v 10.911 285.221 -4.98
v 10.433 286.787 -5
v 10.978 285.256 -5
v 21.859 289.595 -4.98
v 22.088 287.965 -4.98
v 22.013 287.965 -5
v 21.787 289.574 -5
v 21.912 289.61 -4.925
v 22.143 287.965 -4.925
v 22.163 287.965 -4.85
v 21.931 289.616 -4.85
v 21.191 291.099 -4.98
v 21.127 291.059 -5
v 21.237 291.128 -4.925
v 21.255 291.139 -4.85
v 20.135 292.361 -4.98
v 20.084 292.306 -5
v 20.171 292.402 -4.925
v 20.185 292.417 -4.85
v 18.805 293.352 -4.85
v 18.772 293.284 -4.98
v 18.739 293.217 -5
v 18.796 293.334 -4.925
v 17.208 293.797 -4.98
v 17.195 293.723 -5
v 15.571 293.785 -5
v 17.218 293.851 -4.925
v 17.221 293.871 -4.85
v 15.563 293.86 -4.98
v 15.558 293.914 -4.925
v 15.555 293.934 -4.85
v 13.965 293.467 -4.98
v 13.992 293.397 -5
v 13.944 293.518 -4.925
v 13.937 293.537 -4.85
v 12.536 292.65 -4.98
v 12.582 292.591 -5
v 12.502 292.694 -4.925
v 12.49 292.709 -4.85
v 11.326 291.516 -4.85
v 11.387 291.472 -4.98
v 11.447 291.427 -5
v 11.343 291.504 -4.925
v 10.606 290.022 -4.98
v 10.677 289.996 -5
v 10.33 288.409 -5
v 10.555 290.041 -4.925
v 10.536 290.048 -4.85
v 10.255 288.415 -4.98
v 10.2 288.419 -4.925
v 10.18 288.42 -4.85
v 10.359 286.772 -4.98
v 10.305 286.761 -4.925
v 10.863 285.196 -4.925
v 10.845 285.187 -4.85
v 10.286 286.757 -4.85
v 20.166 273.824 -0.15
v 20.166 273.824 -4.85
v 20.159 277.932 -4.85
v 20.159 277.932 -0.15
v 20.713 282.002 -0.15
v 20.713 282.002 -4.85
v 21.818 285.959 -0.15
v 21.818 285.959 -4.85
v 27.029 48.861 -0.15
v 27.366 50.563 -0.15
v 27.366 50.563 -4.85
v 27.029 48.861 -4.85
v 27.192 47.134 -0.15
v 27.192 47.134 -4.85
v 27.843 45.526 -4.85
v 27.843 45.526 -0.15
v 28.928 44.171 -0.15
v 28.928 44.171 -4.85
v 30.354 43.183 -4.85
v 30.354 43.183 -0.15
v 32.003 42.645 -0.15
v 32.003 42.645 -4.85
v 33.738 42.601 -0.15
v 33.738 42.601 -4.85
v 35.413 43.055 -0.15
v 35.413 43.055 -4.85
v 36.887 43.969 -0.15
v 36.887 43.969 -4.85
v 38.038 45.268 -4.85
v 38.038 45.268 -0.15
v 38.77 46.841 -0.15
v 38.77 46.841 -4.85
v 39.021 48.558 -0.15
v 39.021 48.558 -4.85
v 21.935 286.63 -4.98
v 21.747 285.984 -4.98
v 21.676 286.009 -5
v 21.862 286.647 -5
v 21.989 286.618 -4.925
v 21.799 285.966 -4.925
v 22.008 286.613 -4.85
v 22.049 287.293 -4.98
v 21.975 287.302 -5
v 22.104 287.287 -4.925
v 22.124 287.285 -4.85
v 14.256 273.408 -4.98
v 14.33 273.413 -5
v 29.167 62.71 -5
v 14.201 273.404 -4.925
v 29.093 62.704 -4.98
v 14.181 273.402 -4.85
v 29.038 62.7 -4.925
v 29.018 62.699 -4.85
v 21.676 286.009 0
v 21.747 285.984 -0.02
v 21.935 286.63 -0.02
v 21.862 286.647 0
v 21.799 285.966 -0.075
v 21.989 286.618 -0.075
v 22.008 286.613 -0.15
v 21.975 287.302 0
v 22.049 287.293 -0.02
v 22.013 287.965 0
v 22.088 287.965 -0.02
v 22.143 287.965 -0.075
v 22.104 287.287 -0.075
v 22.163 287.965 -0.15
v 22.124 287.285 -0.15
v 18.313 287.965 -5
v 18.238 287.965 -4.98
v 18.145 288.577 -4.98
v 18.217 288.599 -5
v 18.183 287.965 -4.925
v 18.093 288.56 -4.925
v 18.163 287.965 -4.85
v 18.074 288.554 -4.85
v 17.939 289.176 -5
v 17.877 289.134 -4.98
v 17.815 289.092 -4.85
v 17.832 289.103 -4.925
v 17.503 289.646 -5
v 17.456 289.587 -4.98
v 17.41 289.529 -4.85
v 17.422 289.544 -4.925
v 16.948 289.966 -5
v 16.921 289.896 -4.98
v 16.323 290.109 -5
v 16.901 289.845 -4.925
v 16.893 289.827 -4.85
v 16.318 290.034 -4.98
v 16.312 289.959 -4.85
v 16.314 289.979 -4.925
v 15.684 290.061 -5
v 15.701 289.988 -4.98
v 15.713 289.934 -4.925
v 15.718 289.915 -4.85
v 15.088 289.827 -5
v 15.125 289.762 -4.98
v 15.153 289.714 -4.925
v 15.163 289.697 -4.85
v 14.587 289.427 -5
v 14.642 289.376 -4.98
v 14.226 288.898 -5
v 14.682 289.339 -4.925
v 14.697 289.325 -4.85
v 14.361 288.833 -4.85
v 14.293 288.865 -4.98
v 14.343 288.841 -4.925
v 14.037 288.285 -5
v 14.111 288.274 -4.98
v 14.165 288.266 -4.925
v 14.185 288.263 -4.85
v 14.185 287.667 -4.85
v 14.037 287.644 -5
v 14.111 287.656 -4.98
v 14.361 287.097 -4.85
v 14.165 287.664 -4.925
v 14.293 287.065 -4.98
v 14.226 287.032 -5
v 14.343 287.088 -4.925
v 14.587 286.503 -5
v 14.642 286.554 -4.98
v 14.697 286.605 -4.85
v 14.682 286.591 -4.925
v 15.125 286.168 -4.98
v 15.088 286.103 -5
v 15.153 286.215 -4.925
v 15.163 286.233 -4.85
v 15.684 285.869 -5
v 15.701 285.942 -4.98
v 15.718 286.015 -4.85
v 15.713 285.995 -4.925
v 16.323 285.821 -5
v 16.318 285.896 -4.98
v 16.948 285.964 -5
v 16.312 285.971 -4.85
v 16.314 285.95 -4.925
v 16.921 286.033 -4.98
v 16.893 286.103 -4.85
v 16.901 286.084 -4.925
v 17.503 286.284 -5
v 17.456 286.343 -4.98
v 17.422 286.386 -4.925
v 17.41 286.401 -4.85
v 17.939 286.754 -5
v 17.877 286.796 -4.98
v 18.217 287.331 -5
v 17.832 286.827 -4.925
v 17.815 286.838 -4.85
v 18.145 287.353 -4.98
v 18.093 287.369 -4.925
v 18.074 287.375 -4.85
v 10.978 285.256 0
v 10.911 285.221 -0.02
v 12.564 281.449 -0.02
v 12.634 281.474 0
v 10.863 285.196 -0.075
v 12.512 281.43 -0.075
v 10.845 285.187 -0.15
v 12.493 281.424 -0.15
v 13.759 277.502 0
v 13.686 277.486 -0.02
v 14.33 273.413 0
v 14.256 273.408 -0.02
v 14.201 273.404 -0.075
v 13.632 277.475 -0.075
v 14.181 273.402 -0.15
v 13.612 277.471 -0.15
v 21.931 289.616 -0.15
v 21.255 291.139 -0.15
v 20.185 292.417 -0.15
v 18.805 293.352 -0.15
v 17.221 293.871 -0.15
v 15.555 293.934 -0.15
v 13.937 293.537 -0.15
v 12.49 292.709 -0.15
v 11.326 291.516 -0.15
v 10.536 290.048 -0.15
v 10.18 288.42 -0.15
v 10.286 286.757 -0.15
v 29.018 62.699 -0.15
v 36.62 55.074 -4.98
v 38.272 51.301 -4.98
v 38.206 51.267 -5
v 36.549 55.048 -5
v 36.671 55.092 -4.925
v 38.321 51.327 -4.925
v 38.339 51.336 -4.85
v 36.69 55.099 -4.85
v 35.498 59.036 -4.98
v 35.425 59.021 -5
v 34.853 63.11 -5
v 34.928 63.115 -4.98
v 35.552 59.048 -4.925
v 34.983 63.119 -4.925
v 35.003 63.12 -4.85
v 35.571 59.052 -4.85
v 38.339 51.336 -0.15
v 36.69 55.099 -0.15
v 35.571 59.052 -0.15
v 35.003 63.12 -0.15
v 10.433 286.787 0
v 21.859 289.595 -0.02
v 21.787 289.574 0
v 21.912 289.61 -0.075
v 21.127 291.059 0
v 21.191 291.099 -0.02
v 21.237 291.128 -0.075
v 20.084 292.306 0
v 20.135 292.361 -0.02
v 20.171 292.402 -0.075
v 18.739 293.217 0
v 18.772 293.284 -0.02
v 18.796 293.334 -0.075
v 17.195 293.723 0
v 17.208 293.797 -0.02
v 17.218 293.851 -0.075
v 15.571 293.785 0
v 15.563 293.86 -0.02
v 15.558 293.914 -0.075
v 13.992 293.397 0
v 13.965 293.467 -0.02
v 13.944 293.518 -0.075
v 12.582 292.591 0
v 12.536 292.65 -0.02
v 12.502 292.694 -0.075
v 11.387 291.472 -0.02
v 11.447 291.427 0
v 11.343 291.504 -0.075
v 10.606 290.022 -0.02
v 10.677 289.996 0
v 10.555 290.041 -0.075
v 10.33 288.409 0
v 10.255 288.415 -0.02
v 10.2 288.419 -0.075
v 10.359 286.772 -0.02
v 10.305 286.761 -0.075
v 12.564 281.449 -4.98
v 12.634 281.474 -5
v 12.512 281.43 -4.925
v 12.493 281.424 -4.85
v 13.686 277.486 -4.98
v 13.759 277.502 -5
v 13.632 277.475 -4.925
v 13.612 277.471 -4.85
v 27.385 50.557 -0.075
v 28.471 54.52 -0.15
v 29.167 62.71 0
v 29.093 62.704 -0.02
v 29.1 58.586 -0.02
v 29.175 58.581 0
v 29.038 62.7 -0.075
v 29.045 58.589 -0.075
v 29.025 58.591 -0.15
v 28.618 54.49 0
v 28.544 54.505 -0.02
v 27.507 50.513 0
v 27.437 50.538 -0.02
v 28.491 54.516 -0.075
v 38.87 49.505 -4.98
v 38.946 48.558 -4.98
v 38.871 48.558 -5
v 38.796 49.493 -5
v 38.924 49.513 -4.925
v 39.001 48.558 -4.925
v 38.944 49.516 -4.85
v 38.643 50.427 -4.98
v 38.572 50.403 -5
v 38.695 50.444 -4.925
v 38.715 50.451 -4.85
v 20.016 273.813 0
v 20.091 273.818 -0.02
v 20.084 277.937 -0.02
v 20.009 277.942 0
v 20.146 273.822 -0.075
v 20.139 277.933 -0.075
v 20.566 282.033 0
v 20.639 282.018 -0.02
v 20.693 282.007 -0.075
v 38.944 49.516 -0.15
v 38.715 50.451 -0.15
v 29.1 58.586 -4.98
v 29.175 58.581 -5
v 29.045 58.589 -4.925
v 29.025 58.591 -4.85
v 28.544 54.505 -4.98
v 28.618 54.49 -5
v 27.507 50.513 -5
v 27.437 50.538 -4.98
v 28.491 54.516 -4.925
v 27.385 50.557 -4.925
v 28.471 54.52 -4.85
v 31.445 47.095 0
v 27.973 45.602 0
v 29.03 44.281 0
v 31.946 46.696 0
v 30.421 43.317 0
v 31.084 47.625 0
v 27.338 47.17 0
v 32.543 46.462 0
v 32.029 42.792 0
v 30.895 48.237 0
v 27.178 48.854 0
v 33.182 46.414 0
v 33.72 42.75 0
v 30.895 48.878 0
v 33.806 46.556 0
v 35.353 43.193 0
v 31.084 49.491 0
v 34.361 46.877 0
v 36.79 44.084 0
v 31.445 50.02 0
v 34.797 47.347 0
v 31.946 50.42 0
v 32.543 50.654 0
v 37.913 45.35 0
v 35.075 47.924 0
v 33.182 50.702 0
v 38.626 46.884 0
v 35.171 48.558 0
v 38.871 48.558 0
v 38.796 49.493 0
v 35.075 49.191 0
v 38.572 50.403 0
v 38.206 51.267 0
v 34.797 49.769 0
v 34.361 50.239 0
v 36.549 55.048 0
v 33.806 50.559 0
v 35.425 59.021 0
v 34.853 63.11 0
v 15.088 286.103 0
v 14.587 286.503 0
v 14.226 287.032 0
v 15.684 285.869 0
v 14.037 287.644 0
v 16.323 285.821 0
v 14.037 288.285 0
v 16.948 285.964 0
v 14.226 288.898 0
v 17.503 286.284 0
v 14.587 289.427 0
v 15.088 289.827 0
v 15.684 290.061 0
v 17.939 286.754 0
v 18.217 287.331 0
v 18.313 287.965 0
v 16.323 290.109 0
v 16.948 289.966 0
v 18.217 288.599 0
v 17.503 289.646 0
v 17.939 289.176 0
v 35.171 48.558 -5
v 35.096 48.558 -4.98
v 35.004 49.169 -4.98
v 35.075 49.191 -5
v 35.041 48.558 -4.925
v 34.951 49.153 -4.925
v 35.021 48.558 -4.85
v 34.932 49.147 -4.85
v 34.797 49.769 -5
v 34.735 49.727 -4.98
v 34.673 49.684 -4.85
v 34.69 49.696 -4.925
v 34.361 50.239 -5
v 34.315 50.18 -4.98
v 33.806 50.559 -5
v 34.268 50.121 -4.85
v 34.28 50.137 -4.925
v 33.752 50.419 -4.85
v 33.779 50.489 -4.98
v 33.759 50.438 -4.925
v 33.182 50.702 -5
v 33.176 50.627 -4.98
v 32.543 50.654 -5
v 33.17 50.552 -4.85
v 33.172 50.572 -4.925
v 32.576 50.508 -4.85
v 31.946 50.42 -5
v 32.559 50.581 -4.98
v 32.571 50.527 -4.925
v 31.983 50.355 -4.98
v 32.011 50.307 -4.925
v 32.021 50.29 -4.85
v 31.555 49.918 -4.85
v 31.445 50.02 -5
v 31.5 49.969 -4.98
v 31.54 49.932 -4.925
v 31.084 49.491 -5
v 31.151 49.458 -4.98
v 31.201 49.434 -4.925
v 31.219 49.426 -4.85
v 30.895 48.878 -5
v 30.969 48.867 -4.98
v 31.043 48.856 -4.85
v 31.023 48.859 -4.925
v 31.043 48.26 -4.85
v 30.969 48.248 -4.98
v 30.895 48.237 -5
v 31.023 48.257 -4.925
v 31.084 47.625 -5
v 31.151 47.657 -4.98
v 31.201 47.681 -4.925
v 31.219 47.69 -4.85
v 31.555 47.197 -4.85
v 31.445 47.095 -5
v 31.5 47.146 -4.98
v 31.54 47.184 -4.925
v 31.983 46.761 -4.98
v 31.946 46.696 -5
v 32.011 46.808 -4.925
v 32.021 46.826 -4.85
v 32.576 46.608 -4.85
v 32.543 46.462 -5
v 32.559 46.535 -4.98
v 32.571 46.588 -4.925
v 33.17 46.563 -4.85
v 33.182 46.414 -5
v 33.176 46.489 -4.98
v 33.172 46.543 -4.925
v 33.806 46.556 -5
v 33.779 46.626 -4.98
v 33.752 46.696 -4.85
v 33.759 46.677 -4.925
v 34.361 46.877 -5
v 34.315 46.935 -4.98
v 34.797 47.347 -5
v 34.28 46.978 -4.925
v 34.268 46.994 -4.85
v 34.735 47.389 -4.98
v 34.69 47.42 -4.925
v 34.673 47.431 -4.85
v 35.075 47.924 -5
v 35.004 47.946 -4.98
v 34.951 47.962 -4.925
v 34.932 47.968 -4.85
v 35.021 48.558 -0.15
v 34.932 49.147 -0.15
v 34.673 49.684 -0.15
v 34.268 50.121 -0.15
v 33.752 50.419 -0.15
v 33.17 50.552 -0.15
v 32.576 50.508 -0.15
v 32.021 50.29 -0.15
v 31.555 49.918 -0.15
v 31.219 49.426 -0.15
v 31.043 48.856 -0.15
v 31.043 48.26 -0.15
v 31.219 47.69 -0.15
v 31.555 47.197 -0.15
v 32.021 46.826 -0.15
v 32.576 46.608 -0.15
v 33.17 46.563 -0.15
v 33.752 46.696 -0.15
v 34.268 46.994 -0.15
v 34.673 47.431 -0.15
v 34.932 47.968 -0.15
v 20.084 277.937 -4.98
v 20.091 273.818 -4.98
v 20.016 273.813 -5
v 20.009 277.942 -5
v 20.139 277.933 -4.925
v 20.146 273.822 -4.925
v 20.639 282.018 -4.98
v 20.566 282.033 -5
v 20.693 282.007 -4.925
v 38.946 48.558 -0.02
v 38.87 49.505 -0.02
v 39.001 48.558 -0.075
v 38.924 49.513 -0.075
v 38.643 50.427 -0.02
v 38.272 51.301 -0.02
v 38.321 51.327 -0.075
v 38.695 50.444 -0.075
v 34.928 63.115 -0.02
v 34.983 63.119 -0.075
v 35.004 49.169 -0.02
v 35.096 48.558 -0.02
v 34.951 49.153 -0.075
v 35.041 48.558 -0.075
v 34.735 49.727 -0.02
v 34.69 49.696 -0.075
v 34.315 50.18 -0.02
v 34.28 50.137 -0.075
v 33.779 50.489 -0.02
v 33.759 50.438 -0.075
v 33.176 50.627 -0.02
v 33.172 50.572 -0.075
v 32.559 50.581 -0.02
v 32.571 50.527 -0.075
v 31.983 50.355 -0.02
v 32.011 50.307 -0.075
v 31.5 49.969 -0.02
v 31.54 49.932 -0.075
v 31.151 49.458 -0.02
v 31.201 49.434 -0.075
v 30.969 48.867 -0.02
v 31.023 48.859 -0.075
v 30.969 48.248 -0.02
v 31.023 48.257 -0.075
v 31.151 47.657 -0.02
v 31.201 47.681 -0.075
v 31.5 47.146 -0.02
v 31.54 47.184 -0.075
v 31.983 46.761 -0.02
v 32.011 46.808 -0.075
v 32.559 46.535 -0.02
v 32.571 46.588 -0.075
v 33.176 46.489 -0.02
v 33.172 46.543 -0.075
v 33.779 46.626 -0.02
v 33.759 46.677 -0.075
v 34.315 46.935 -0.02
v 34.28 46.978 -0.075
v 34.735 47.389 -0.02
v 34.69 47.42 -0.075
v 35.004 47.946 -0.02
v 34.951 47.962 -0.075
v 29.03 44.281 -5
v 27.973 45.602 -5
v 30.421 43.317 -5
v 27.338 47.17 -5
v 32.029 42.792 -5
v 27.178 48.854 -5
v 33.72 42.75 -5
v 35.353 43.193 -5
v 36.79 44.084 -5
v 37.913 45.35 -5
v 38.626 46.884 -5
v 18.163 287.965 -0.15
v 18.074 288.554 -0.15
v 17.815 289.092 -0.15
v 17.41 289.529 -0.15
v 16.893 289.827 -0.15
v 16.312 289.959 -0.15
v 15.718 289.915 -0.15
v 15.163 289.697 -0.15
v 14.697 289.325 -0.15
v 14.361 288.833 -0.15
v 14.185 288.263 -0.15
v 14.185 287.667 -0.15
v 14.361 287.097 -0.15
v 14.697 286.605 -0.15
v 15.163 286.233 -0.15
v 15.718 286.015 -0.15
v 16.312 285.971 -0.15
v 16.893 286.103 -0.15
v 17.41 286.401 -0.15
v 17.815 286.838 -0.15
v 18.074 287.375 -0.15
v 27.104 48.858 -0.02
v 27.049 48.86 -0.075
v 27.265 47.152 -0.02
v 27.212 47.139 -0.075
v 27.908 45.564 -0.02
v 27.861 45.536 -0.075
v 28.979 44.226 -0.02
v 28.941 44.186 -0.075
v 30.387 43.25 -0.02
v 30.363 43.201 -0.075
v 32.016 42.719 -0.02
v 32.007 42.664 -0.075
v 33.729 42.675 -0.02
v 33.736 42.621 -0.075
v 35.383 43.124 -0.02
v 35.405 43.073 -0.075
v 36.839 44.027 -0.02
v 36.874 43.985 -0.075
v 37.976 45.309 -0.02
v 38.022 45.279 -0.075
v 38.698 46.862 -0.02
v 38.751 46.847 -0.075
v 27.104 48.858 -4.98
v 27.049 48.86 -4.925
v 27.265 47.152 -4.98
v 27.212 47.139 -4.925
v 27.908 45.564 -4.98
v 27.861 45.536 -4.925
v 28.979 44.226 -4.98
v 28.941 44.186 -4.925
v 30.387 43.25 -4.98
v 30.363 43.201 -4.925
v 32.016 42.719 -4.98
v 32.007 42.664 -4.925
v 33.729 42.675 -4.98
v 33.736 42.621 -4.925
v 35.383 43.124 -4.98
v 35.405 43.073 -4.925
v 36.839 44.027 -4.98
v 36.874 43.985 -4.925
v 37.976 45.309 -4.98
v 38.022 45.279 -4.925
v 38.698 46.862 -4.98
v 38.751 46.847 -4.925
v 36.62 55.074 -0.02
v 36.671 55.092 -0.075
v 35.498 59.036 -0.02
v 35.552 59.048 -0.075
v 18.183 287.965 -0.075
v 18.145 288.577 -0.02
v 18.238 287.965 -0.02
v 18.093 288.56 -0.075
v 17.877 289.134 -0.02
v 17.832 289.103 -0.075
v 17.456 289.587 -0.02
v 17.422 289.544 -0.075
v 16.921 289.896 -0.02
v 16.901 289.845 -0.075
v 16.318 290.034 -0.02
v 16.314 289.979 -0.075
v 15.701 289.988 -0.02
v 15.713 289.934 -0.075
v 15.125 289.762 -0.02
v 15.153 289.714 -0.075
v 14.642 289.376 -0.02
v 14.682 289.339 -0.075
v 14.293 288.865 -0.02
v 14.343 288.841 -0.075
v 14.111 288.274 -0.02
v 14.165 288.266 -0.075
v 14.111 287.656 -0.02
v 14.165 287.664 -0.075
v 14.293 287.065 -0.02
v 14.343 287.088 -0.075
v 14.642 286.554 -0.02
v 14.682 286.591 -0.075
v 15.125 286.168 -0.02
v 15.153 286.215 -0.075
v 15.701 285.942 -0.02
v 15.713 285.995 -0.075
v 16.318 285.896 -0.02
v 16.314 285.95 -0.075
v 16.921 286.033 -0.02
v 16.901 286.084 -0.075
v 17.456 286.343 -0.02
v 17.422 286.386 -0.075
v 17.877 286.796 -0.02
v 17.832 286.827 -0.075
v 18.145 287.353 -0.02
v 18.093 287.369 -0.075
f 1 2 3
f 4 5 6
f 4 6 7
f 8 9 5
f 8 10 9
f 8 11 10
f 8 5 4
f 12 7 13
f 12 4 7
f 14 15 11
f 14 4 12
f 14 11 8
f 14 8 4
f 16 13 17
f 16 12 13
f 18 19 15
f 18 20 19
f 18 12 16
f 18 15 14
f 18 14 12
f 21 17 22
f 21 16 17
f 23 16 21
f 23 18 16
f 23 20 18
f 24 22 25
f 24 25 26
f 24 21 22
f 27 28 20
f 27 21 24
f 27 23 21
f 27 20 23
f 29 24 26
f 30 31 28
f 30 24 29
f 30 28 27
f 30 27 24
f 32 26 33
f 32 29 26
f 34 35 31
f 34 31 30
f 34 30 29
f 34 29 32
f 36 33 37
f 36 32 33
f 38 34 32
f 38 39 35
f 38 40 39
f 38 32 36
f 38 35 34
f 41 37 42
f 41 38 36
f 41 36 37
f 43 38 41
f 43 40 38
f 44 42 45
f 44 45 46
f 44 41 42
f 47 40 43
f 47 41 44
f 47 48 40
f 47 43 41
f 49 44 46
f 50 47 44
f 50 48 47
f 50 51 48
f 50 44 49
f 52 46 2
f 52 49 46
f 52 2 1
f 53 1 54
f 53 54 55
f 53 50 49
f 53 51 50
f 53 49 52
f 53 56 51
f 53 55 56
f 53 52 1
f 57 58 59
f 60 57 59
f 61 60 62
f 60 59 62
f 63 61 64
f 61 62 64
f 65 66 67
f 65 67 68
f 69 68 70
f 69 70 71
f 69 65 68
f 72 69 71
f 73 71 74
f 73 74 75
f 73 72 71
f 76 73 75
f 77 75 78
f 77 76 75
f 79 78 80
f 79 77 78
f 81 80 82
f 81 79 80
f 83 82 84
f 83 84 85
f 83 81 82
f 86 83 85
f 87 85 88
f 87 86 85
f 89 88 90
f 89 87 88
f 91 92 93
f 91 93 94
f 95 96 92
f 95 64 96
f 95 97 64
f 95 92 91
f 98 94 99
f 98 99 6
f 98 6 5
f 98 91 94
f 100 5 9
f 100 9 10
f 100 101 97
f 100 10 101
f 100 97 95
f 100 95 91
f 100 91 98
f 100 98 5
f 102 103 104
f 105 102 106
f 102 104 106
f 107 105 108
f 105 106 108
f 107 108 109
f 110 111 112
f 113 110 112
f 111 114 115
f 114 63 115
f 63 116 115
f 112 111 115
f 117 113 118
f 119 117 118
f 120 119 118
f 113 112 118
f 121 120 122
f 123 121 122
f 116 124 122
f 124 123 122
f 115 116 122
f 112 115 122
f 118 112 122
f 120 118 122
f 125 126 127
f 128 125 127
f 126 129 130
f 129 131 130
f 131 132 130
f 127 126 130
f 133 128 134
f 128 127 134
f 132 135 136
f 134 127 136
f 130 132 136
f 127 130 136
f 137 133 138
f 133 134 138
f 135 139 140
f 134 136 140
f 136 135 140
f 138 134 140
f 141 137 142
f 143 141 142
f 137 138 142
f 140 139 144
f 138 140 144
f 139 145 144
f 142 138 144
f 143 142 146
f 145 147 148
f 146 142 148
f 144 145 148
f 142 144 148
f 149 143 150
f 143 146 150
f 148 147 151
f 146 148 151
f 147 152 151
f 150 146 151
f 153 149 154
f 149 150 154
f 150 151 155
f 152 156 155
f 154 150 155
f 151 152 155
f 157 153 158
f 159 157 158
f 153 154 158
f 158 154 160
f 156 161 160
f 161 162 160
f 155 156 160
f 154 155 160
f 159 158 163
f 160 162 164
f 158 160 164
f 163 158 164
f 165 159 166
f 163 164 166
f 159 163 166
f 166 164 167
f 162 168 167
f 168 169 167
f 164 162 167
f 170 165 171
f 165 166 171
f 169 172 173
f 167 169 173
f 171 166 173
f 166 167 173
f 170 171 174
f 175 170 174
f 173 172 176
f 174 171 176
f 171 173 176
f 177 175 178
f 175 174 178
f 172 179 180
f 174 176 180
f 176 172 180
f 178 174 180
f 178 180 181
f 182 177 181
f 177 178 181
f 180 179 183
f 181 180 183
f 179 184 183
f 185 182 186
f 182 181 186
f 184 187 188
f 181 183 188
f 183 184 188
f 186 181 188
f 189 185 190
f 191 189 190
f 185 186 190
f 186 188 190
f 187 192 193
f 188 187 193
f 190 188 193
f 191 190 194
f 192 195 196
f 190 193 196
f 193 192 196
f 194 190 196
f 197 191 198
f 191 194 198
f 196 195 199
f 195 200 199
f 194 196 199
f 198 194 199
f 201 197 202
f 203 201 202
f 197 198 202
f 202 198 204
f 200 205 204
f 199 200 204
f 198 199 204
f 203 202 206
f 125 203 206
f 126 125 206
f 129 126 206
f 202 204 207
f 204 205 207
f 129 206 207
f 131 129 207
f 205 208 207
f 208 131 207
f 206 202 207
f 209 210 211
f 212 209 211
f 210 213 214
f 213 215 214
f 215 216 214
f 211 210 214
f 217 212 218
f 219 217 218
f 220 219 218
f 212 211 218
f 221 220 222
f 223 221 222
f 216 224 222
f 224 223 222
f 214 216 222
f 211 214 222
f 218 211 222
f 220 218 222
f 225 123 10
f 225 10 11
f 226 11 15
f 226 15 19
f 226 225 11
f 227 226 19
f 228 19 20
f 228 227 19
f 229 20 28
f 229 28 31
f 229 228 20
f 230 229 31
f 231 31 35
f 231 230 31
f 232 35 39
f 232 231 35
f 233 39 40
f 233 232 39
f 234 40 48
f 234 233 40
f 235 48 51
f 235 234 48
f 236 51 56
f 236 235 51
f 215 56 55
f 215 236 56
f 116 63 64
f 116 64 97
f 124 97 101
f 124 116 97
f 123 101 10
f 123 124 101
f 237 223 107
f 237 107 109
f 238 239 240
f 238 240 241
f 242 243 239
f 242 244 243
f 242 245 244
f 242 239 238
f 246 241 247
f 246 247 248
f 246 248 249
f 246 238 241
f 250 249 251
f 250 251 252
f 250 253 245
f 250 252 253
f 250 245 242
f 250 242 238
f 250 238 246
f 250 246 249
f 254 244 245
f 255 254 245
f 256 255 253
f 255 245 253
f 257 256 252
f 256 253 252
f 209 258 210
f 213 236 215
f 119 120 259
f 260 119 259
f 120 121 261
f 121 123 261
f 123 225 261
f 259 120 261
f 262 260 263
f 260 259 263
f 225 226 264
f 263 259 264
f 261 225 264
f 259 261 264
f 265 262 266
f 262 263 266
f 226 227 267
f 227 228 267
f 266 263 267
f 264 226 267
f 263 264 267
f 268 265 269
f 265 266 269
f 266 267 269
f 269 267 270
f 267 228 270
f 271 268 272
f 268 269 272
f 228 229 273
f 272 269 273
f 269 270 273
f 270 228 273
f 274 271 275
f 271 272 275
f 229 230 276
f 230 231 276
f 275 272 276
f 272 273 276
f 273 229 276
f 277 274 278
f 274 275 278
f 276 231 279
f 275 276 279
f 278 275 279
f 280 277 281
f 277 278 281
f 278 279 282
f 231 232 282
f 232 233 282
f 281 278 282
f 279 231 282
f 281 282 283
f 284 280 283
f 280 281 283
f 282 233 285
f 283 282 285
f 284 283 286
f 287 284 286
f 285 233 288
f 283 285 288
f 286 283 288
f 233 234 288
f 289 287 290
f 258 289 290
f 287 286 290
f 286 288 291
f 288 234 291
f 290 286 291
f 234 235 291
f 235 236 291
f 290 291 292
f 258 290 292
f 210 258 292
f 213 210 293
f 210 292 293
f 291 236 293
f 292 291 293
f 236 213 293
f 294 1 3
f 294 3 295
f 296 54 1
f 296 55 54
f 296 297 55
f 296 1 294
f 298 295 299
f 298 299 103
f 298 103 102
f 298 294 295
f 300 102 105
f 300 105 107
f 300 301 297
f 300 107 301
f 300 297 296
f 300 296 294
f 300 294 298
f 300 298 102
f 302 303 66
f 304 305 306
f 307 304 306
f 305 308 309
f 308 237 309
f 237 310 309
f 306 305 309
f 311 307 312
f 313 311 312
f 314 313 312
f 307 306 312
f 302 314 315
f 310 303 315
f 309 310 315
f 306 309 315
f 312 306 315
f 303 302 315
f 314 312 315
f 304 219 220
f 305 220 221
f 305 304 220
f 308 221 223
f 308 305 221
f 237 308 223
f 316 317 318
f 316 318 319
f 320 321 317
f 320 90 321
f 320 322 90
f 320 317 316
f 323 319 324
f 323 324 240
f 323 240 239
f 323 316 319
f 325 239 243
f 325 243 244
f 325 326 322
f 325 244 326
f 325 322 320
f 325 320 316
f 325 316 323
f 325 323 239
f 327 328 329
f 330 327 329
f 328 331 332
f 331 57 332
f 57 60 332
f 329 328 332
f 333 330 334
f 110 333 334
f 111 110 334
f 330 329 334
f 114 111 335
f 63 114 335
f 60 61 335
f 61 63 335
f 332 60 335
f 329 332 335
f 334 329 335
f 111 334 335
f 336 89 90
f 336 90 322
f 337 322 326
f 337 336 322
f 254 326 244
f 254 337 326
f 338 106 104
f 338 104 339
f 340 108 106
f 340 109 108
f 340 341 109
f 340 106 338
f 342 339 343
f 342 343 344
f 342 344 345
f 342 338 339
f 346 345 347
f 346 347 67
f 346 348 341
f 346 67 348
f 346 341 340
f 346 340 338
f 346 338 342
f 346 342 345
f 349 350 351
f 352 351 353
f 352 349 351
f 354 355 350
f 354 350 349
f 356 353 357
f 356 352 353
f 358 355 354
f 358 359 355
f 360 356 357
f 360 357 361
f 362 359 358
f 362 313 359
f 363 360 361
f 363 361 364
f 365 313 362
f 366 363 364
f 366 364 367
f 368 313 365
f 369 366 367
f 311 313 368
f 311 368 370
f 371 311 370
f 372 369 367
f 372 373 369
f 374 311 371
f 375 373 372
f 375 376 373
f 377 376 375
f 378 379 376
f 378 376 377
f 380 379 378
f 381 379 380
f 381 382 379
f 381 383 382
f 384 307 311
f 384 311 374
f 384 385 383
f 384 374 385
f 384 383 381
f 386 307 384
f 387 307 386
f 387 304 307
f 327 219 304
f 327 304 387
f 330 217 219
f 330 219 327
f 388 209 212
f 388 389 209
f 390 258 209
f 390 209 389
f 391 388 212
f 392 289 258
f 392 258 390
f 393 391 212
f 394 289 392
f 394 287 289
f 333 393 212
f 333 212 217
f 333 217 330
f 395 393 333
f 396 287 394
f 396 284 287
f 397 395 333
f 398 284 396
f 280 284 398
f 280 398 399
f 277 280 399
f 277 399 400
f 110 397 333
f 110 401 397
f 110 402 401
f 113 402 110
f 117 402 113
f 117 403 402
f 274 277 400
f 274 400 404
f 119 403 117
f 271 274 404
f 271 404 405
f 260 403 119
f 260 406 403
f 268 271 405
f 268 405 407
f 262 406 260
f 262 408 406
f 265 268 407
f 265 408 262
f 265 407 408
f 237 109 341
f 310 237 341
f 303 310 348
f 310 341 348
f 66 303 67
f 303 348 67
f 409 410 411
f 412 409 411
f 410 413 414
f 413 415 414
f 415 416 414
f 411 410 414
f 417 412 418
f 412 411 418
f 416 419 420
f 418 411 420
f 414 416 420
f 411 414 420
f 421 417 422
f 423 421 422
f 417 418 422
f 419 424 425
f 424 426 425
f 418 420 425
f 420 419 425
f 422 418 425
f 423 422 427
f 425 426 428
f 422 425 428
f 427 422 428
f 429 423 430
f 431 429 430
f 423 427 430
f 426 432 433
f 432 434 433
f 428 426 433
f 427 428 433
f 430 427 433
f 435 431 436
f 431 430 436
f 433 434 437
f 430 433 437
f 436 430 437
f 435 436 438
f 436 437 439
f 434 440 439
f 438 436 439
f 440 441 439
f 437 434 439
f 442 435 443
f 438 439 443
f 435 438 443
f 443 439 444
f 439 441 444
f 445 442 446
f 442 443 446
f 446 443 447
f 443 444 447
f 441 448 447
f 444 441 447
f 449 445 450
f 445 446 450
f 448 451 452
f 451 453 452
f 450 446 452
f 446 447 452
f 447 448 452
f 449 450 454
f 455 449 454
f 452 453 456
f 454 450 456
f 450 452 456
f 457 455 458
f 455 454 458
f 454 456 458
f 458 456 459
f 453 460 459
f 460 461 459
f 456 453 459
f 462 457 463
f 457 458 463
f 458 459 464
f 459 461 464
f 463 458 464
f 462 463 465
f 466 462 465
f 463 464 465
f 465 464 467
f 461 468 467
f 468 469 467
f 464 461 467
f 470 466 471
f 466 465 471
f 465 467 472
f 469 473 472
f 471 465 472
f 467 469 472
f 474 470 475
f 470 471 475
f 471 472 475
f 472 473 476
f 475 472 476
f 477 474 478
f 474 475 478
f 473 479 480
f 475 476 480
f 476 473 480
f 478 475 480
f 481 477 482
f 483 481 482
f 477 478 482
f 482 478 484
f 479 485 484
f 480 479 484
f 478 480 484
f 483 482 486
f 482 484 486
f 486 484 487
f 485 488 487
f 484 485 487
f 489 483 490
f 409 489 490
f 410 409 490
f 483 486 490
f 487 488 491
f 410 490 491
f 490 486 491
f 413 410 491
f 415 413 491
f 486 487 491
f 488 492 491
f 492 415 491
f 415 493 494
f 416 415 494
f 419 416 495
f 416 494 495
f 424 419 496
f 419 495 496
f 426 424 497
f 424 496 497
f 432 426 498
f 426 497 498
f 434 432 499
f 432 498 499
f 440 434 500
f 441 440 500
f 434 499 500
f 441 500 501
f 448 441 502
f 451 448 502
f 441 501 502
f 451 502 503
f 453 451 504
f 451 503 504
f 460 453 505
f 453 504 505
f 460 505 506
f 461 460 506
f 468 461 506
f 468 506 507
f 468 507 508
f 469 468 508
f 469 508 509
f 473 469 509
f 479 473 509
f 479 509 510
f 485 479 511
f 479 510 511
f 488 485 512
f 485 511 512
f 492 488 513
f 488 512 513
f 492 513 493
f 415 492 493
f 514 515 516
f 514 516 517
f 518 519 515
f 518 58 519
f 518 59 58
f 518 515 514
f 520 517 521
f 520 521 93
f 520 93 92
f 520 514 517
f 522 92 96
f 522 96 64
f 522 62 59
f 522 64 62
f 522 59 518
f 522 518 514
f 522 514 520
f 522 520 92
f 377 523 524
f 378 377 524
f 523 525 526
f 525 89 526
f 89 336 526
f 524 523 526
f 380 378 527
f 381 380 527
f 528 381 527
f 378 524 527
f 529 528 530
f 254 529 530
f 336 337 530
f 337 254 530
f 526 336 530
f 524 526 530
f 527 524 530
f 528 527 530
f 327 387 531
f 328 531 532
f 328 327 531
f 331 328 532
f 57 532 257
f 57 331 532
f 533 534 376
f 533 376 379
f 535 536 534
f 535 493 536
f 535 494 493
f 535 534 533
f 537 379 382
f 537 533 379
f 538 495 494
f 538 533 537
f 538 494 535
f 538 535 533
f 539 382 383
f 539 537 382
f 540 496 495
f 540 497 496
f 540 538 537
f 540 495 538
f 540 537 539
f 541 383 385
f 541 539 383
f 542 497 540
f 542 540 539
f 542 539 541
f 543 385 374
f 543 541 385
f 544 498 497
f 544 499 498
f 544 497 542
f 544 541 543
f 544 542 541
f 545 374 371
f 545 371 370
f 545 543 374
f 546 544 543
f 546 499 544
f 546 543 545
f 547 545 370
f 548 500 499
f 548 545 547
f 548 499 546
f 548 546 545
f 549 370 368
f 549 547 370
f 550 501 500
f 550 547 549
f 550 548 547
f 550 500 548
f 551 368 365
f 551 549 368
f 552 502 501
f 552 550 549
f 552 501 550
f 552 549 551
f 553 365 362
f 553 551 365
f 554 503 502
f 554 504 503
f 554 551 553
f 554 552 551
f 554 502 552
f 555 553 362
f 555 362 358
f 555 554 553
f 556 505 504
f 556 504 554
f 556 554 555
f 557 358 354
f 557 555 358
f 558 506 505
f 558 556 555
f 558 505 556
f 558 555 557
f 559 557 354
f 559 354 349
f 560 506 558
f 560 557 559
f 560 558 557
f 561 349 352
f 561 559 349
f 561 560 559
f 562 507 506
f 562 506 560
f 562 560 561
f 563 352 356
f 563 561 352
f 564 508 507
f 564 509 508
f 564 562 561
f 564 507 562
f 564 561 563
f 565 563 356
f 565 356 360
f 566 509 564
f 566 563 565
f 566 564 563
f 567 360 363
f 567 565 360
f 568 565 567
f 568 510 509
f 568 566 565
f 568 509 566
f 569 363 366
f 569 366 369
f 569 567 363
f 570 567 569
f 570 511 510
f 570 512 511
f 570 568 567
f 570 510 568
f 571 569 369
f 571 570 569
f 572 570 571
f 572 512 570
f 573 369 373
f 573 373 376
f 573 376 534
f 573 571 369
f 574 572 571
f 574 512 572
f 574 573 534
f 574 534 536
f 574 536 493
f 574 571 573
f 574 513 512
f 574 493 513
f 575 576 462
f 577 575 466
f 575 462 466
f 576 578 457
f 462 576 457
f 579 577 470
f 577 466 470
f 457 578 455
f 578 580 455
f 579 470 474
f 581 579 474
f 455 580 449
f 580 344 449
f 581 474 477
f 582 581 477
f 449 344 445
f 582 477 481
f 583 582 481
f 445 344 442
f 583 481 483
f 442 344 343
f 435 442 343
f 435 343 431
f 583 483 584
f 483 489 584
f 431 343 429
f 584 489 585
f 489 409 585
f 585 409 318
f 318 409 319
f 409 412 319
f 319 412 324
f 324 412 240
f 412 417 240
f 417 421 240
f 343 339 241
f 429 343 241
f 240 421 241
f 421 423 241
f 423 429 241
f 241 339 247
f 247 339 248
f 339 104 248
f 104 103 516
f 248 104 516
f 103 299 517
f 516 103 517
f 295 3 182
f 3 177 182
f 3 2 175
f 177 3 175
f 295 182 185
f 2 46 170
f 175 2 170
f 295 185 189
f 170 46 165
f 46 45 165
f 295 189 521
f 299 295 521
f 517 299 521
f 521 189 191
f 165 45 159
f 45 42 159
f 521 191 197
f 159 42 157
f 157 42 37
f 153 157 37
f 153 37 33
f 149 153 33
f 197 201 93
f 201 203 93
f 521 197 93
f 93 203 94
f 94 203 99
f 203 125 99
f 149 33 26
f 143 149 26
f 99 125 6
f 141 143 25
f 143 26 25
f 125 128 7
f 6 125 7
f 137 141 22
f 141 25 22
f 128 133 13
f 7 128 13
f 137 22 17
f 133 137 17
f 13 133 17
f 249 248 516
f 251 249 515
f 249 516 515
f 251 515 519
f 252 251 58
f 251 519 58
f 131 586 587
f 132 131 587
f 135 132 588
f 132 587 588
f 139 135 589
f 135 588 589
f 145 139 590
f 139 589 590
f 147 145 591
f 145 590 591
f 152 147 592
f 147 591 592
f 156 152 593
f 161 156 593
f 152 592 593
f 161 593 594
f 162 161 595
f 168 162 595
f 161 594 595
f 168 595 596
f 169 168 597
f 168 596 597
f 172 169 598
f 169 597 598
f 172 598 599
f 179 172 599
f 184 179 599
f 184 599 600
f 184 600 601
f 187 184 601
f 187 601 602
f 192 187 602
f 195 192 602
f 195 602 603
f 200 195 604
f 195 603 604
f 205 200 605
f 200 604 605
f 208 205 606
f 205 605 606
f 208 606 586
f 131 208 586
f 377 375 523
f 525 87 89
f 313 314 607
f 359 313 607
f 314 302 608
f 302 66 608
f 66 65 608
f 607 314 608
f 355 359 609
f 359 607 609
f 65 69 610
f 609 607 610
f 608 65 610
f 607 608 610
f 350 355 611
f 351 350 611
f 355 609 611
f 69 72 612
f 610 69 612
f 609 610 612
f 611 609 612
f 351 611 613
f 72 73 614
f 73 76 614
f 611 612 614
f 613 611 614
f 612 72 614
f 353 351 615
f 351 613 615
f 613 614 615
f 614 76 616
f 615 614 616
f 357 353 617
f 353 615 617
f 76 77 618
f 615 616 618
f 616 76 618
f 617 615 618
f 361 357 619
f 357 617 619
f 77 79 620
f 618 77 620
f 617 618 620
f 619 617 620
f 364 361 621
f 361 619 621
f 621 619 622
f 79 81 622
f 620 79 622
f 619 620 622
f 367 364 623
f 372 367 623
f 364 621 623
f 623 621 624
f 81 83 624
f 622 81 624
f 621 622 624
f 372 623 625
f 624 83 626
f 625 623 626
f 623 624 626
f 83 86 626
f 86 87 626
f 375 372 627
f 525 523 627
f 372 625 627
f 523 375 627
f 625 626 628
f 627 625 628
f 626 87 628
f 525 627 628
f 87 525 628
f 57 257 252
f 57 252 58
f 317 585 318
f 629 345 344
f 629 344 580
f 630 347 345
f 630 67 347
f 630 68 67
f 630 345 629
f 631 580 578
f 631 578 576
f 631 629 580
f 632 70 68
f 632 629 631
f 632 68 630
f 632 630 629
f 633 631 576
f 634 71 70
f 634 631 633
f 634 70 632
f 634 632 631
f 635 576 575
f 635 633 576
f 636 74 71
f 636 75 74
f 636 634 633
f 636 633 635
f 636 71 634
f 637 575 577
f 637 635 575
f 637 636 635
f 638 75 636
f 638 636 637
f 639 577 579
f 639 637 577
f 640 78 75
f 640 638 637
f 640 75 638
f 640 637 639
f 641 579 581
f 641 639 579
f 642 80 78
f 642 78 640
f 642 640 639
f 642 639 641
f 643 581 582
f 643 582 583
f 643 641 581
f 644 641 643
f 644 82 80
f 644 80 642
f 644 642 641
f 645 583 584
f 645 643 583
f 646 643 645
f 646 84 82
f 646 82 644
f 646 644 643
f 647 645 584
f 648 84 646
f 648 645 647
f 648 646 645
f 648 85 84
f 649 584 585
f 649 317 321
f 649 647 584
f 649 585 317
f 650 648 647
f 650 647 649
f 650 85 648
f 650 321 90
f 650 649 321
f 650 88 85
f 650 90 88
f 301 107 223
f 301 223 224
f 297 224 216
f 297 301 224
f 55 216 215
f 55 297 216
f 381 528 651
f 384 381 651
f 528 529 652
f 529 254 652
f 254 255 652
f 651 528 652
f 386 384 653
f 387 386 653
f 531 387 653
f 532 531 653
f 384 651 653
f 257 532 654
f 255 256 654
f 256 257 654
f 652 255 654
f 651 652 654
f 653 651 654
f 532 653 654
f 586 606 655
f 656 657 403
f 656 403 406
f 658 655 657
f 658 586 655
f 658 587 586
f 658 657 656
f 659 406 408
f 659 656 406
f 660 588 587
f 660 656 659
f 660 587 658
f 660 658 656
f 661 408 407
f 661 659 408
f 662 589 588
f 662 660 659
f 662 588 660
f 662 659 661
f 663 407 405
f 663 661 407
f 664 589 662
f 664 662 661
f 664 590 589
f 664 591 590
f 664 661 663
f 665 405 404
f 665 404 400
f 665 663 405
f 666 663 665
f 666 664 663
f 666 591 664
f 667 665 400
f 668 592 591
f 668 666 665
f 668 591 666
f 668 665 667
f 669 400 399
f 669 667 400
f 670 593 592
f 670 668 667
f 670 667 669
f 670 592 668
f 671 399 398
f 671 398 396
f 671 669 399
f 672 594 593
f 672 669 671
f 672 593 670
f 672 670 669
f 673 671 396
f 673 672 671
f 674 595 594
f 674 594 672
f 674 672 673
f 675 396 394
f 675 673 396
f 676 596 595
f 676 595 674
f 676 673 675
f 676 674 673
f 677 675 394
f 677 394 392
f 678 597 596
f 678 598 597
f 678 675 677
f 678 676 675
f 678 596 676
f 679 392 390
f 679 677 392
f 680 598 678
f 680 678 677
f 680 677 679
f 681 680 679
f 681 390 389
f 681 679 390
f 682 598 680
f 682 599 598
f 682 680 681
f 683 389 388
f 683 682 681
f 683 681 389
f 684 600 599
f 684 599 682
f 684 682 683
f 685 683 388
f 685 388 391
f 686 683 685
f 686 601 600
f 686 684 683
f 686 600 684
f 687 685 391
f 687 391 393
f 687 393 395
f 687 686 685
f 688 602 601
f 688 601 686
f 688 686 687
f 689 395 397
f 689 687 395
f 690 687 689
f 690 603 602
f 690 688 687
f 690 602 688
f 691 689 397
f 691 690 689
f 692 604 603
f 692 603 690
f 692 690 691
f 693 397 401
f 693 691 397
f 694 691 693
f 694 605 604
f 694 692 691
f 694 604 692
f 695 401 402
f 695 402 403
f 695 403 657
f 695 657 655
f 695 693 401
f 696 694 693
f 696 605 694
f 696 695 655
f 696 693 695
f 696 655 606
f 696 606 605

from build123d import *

# Parameters (mm, degrees)
SKETCH1_R           = 2
BOSS_EXTRUDE1_DEPTH = 5
FILLET1_R           = 30
FILLET3_R           = 0.15


with BuildPart() as part:
    # Sketch1 → Boss-Extrude1 (new body)
    with BuildSketch(Plane.XY):
        with BuildLine():
            Line((13.535081633, 282.570881488), (29.663369528, 53.530334851))
            ThreePointArc((29.663369528, 53.530334851), (32.599494793, 54.54292527), (35.64854907, 53.951791664))
            Line((35.64854907, 53.951791664), (19.520261175, 282.992338301))
            ThreePointArc((19.520261175, 282.992338301), (16.58413591, 281.979747882), (13.535081633, 282.570881488))
        make_face()
        with BuildLine():
            Line((13.170089326, 287.754199018), (13.535081633, 282.570881488))
            ThreePointArc((13.535081633, 282.570881488), (16.58413591, 281.979747882), (19.520261175, 282.992338301))
            Line((19.520261175, 282.992338301), (19.155268869, 288.175655831))
            ThreePointArc((19.155268869, 288.175655831), (16.373407504, 284.972337653), (13.170089326, 287.754199018))
        make_face()
        with BuildLine():
            ThreePointArc((22.162679097, 287.964927424), (12.981923274, 293.052440804), (13.535081633, 282.570881488))
            Line((13.535081633, 282.570881488), (13.170089326, 287.754199018))
            ThreePointArc((13.170089326, 287.754199018), (15.951950691, 290.957517195), (19.155268869, 288.175655831))
            Line((19.155268869, 288.175655831), (19.520261175, 282.992338301))
            ThreePointArc((19.520261175, 282.992338301), (21.461051134, 285.149389506), (22.162679097, 287.964927424))
        make_face()
        with BuildLine():
            ThreePointArc((19.155268869, 288.175655831), (15.951950691, 290.957517195), (13.170089326, 287.754199018))
            ThreePointArc((13.170089326, 287.754199018), (16.373407504, 284.972337653), (19.155268869, 288.175655831))
        make_face()
        with Locations((16.162679097, 287.964927424)):
            Circle(SKETCH1_R, mode=Mode.SUBTRACT)
        with BuildLine():
            ThreePointArc((30.028361834, 48.347017321), (33.231680012, 45.565155956), (36.013541377, 48.768474134))
            ThreePointArc((36.013541377, 48.768474134), (32.810223199, 51.550335499), (30.028361834, 48.347017321))
        make_face()
        with Locations((33.020951605, 48.557745727)):
            Circle(SKETCH1_R, mode=Mode.SUBTRACT)
        with BuildLine():
            ThreePointArc((36.013541377, 48.768474134), (33.231680012, 45.565155956), (30.028361834, 48.347017321))
            Line((30.028361834, 48.347017321), (29.663369528, 53.530334851))
            ThreePointArc((29.663369528, 53.530334851), (30.205413687, 43.259373691), (39.020951605, 48.557745727))
            ThreePointArc((39.020951605, 48.557745727), (38.108464986, 51.73850155), (35.64854907, 53.951791664))
            Line((35.64854907, 53.951791664), (36.013541377, 48.768474134))
        make_face()
        with BuildLine():
            Line((29.663369528, 53.530334851), (30.028361834, 48.347017321))
            ThreePointArc((30.028361834, 48.347017321), (32.810223199, 51.550335499), (36.013541377, 48.768474134))
            Line((36.013541377, 48.768474134), (35.64854907, 53.951791664))
            ThreePointArc((35.64854907, 53.951791664), (32.599494793, 54.54292527), (29.663369528, 53.530334851))
        make_face()
    extrude(amount=-BOSS_EXTRUDE1_DEPTH)

    # Fillet1
    fillet1_edges = [part.edges().sort_by_distance(p)[0] for p in [
        (29.663369528, 53.530334851, -2.5),
        (13.535081633, 282.570881488, -2.5),
        (19.520261175, 282.992338301, -2.5),
        (35.64854907, 53.951791664, -2.5),
    ]]
    fillet(fillet1_edges, radius=FILLET1_R)

    # Fillet3
    fillet3_edges = [part.edges().sort_by_distance(p)[0] for p in [
        (27.584405123, 168.472064982, 0),
        (27.584405123, 168.472064982, -5),
        (15.741222285, 293.950106967, 0),
        (15.741222285, 293.950106967, -5),
        (21.59922558, 168.050608169, 0),
        (14.162679097, 287.964927424, -5),
        (21.59922558, 168.050608169, -5),
        (32.0033823, 42.644662546, 0),
        (32.0033823, 42.644662546, -5),
        (20.36582871, 279.976666604, 0),
        (20.36582871, 279.976666604, -5),
        (31.020951605, 48.557745727, -5),
        (13.120470236, 279.466472103, 0),
        (13.120470236, 279.466472103, -5),
        (28.817801992, 56.546006547, 0),
        (28.817801992, 56.546006547, -5),
        (36.063160467, 57.056201048, 0),
        (36.063160467, 57.056201048, -5),
        (31.020951605, 48.557745727, 0),
        (14.162679097, 287.964927424, 0),
    ]]
    fillet(fillet3_edges, radius=FILLET3_R)


solid = part.part
